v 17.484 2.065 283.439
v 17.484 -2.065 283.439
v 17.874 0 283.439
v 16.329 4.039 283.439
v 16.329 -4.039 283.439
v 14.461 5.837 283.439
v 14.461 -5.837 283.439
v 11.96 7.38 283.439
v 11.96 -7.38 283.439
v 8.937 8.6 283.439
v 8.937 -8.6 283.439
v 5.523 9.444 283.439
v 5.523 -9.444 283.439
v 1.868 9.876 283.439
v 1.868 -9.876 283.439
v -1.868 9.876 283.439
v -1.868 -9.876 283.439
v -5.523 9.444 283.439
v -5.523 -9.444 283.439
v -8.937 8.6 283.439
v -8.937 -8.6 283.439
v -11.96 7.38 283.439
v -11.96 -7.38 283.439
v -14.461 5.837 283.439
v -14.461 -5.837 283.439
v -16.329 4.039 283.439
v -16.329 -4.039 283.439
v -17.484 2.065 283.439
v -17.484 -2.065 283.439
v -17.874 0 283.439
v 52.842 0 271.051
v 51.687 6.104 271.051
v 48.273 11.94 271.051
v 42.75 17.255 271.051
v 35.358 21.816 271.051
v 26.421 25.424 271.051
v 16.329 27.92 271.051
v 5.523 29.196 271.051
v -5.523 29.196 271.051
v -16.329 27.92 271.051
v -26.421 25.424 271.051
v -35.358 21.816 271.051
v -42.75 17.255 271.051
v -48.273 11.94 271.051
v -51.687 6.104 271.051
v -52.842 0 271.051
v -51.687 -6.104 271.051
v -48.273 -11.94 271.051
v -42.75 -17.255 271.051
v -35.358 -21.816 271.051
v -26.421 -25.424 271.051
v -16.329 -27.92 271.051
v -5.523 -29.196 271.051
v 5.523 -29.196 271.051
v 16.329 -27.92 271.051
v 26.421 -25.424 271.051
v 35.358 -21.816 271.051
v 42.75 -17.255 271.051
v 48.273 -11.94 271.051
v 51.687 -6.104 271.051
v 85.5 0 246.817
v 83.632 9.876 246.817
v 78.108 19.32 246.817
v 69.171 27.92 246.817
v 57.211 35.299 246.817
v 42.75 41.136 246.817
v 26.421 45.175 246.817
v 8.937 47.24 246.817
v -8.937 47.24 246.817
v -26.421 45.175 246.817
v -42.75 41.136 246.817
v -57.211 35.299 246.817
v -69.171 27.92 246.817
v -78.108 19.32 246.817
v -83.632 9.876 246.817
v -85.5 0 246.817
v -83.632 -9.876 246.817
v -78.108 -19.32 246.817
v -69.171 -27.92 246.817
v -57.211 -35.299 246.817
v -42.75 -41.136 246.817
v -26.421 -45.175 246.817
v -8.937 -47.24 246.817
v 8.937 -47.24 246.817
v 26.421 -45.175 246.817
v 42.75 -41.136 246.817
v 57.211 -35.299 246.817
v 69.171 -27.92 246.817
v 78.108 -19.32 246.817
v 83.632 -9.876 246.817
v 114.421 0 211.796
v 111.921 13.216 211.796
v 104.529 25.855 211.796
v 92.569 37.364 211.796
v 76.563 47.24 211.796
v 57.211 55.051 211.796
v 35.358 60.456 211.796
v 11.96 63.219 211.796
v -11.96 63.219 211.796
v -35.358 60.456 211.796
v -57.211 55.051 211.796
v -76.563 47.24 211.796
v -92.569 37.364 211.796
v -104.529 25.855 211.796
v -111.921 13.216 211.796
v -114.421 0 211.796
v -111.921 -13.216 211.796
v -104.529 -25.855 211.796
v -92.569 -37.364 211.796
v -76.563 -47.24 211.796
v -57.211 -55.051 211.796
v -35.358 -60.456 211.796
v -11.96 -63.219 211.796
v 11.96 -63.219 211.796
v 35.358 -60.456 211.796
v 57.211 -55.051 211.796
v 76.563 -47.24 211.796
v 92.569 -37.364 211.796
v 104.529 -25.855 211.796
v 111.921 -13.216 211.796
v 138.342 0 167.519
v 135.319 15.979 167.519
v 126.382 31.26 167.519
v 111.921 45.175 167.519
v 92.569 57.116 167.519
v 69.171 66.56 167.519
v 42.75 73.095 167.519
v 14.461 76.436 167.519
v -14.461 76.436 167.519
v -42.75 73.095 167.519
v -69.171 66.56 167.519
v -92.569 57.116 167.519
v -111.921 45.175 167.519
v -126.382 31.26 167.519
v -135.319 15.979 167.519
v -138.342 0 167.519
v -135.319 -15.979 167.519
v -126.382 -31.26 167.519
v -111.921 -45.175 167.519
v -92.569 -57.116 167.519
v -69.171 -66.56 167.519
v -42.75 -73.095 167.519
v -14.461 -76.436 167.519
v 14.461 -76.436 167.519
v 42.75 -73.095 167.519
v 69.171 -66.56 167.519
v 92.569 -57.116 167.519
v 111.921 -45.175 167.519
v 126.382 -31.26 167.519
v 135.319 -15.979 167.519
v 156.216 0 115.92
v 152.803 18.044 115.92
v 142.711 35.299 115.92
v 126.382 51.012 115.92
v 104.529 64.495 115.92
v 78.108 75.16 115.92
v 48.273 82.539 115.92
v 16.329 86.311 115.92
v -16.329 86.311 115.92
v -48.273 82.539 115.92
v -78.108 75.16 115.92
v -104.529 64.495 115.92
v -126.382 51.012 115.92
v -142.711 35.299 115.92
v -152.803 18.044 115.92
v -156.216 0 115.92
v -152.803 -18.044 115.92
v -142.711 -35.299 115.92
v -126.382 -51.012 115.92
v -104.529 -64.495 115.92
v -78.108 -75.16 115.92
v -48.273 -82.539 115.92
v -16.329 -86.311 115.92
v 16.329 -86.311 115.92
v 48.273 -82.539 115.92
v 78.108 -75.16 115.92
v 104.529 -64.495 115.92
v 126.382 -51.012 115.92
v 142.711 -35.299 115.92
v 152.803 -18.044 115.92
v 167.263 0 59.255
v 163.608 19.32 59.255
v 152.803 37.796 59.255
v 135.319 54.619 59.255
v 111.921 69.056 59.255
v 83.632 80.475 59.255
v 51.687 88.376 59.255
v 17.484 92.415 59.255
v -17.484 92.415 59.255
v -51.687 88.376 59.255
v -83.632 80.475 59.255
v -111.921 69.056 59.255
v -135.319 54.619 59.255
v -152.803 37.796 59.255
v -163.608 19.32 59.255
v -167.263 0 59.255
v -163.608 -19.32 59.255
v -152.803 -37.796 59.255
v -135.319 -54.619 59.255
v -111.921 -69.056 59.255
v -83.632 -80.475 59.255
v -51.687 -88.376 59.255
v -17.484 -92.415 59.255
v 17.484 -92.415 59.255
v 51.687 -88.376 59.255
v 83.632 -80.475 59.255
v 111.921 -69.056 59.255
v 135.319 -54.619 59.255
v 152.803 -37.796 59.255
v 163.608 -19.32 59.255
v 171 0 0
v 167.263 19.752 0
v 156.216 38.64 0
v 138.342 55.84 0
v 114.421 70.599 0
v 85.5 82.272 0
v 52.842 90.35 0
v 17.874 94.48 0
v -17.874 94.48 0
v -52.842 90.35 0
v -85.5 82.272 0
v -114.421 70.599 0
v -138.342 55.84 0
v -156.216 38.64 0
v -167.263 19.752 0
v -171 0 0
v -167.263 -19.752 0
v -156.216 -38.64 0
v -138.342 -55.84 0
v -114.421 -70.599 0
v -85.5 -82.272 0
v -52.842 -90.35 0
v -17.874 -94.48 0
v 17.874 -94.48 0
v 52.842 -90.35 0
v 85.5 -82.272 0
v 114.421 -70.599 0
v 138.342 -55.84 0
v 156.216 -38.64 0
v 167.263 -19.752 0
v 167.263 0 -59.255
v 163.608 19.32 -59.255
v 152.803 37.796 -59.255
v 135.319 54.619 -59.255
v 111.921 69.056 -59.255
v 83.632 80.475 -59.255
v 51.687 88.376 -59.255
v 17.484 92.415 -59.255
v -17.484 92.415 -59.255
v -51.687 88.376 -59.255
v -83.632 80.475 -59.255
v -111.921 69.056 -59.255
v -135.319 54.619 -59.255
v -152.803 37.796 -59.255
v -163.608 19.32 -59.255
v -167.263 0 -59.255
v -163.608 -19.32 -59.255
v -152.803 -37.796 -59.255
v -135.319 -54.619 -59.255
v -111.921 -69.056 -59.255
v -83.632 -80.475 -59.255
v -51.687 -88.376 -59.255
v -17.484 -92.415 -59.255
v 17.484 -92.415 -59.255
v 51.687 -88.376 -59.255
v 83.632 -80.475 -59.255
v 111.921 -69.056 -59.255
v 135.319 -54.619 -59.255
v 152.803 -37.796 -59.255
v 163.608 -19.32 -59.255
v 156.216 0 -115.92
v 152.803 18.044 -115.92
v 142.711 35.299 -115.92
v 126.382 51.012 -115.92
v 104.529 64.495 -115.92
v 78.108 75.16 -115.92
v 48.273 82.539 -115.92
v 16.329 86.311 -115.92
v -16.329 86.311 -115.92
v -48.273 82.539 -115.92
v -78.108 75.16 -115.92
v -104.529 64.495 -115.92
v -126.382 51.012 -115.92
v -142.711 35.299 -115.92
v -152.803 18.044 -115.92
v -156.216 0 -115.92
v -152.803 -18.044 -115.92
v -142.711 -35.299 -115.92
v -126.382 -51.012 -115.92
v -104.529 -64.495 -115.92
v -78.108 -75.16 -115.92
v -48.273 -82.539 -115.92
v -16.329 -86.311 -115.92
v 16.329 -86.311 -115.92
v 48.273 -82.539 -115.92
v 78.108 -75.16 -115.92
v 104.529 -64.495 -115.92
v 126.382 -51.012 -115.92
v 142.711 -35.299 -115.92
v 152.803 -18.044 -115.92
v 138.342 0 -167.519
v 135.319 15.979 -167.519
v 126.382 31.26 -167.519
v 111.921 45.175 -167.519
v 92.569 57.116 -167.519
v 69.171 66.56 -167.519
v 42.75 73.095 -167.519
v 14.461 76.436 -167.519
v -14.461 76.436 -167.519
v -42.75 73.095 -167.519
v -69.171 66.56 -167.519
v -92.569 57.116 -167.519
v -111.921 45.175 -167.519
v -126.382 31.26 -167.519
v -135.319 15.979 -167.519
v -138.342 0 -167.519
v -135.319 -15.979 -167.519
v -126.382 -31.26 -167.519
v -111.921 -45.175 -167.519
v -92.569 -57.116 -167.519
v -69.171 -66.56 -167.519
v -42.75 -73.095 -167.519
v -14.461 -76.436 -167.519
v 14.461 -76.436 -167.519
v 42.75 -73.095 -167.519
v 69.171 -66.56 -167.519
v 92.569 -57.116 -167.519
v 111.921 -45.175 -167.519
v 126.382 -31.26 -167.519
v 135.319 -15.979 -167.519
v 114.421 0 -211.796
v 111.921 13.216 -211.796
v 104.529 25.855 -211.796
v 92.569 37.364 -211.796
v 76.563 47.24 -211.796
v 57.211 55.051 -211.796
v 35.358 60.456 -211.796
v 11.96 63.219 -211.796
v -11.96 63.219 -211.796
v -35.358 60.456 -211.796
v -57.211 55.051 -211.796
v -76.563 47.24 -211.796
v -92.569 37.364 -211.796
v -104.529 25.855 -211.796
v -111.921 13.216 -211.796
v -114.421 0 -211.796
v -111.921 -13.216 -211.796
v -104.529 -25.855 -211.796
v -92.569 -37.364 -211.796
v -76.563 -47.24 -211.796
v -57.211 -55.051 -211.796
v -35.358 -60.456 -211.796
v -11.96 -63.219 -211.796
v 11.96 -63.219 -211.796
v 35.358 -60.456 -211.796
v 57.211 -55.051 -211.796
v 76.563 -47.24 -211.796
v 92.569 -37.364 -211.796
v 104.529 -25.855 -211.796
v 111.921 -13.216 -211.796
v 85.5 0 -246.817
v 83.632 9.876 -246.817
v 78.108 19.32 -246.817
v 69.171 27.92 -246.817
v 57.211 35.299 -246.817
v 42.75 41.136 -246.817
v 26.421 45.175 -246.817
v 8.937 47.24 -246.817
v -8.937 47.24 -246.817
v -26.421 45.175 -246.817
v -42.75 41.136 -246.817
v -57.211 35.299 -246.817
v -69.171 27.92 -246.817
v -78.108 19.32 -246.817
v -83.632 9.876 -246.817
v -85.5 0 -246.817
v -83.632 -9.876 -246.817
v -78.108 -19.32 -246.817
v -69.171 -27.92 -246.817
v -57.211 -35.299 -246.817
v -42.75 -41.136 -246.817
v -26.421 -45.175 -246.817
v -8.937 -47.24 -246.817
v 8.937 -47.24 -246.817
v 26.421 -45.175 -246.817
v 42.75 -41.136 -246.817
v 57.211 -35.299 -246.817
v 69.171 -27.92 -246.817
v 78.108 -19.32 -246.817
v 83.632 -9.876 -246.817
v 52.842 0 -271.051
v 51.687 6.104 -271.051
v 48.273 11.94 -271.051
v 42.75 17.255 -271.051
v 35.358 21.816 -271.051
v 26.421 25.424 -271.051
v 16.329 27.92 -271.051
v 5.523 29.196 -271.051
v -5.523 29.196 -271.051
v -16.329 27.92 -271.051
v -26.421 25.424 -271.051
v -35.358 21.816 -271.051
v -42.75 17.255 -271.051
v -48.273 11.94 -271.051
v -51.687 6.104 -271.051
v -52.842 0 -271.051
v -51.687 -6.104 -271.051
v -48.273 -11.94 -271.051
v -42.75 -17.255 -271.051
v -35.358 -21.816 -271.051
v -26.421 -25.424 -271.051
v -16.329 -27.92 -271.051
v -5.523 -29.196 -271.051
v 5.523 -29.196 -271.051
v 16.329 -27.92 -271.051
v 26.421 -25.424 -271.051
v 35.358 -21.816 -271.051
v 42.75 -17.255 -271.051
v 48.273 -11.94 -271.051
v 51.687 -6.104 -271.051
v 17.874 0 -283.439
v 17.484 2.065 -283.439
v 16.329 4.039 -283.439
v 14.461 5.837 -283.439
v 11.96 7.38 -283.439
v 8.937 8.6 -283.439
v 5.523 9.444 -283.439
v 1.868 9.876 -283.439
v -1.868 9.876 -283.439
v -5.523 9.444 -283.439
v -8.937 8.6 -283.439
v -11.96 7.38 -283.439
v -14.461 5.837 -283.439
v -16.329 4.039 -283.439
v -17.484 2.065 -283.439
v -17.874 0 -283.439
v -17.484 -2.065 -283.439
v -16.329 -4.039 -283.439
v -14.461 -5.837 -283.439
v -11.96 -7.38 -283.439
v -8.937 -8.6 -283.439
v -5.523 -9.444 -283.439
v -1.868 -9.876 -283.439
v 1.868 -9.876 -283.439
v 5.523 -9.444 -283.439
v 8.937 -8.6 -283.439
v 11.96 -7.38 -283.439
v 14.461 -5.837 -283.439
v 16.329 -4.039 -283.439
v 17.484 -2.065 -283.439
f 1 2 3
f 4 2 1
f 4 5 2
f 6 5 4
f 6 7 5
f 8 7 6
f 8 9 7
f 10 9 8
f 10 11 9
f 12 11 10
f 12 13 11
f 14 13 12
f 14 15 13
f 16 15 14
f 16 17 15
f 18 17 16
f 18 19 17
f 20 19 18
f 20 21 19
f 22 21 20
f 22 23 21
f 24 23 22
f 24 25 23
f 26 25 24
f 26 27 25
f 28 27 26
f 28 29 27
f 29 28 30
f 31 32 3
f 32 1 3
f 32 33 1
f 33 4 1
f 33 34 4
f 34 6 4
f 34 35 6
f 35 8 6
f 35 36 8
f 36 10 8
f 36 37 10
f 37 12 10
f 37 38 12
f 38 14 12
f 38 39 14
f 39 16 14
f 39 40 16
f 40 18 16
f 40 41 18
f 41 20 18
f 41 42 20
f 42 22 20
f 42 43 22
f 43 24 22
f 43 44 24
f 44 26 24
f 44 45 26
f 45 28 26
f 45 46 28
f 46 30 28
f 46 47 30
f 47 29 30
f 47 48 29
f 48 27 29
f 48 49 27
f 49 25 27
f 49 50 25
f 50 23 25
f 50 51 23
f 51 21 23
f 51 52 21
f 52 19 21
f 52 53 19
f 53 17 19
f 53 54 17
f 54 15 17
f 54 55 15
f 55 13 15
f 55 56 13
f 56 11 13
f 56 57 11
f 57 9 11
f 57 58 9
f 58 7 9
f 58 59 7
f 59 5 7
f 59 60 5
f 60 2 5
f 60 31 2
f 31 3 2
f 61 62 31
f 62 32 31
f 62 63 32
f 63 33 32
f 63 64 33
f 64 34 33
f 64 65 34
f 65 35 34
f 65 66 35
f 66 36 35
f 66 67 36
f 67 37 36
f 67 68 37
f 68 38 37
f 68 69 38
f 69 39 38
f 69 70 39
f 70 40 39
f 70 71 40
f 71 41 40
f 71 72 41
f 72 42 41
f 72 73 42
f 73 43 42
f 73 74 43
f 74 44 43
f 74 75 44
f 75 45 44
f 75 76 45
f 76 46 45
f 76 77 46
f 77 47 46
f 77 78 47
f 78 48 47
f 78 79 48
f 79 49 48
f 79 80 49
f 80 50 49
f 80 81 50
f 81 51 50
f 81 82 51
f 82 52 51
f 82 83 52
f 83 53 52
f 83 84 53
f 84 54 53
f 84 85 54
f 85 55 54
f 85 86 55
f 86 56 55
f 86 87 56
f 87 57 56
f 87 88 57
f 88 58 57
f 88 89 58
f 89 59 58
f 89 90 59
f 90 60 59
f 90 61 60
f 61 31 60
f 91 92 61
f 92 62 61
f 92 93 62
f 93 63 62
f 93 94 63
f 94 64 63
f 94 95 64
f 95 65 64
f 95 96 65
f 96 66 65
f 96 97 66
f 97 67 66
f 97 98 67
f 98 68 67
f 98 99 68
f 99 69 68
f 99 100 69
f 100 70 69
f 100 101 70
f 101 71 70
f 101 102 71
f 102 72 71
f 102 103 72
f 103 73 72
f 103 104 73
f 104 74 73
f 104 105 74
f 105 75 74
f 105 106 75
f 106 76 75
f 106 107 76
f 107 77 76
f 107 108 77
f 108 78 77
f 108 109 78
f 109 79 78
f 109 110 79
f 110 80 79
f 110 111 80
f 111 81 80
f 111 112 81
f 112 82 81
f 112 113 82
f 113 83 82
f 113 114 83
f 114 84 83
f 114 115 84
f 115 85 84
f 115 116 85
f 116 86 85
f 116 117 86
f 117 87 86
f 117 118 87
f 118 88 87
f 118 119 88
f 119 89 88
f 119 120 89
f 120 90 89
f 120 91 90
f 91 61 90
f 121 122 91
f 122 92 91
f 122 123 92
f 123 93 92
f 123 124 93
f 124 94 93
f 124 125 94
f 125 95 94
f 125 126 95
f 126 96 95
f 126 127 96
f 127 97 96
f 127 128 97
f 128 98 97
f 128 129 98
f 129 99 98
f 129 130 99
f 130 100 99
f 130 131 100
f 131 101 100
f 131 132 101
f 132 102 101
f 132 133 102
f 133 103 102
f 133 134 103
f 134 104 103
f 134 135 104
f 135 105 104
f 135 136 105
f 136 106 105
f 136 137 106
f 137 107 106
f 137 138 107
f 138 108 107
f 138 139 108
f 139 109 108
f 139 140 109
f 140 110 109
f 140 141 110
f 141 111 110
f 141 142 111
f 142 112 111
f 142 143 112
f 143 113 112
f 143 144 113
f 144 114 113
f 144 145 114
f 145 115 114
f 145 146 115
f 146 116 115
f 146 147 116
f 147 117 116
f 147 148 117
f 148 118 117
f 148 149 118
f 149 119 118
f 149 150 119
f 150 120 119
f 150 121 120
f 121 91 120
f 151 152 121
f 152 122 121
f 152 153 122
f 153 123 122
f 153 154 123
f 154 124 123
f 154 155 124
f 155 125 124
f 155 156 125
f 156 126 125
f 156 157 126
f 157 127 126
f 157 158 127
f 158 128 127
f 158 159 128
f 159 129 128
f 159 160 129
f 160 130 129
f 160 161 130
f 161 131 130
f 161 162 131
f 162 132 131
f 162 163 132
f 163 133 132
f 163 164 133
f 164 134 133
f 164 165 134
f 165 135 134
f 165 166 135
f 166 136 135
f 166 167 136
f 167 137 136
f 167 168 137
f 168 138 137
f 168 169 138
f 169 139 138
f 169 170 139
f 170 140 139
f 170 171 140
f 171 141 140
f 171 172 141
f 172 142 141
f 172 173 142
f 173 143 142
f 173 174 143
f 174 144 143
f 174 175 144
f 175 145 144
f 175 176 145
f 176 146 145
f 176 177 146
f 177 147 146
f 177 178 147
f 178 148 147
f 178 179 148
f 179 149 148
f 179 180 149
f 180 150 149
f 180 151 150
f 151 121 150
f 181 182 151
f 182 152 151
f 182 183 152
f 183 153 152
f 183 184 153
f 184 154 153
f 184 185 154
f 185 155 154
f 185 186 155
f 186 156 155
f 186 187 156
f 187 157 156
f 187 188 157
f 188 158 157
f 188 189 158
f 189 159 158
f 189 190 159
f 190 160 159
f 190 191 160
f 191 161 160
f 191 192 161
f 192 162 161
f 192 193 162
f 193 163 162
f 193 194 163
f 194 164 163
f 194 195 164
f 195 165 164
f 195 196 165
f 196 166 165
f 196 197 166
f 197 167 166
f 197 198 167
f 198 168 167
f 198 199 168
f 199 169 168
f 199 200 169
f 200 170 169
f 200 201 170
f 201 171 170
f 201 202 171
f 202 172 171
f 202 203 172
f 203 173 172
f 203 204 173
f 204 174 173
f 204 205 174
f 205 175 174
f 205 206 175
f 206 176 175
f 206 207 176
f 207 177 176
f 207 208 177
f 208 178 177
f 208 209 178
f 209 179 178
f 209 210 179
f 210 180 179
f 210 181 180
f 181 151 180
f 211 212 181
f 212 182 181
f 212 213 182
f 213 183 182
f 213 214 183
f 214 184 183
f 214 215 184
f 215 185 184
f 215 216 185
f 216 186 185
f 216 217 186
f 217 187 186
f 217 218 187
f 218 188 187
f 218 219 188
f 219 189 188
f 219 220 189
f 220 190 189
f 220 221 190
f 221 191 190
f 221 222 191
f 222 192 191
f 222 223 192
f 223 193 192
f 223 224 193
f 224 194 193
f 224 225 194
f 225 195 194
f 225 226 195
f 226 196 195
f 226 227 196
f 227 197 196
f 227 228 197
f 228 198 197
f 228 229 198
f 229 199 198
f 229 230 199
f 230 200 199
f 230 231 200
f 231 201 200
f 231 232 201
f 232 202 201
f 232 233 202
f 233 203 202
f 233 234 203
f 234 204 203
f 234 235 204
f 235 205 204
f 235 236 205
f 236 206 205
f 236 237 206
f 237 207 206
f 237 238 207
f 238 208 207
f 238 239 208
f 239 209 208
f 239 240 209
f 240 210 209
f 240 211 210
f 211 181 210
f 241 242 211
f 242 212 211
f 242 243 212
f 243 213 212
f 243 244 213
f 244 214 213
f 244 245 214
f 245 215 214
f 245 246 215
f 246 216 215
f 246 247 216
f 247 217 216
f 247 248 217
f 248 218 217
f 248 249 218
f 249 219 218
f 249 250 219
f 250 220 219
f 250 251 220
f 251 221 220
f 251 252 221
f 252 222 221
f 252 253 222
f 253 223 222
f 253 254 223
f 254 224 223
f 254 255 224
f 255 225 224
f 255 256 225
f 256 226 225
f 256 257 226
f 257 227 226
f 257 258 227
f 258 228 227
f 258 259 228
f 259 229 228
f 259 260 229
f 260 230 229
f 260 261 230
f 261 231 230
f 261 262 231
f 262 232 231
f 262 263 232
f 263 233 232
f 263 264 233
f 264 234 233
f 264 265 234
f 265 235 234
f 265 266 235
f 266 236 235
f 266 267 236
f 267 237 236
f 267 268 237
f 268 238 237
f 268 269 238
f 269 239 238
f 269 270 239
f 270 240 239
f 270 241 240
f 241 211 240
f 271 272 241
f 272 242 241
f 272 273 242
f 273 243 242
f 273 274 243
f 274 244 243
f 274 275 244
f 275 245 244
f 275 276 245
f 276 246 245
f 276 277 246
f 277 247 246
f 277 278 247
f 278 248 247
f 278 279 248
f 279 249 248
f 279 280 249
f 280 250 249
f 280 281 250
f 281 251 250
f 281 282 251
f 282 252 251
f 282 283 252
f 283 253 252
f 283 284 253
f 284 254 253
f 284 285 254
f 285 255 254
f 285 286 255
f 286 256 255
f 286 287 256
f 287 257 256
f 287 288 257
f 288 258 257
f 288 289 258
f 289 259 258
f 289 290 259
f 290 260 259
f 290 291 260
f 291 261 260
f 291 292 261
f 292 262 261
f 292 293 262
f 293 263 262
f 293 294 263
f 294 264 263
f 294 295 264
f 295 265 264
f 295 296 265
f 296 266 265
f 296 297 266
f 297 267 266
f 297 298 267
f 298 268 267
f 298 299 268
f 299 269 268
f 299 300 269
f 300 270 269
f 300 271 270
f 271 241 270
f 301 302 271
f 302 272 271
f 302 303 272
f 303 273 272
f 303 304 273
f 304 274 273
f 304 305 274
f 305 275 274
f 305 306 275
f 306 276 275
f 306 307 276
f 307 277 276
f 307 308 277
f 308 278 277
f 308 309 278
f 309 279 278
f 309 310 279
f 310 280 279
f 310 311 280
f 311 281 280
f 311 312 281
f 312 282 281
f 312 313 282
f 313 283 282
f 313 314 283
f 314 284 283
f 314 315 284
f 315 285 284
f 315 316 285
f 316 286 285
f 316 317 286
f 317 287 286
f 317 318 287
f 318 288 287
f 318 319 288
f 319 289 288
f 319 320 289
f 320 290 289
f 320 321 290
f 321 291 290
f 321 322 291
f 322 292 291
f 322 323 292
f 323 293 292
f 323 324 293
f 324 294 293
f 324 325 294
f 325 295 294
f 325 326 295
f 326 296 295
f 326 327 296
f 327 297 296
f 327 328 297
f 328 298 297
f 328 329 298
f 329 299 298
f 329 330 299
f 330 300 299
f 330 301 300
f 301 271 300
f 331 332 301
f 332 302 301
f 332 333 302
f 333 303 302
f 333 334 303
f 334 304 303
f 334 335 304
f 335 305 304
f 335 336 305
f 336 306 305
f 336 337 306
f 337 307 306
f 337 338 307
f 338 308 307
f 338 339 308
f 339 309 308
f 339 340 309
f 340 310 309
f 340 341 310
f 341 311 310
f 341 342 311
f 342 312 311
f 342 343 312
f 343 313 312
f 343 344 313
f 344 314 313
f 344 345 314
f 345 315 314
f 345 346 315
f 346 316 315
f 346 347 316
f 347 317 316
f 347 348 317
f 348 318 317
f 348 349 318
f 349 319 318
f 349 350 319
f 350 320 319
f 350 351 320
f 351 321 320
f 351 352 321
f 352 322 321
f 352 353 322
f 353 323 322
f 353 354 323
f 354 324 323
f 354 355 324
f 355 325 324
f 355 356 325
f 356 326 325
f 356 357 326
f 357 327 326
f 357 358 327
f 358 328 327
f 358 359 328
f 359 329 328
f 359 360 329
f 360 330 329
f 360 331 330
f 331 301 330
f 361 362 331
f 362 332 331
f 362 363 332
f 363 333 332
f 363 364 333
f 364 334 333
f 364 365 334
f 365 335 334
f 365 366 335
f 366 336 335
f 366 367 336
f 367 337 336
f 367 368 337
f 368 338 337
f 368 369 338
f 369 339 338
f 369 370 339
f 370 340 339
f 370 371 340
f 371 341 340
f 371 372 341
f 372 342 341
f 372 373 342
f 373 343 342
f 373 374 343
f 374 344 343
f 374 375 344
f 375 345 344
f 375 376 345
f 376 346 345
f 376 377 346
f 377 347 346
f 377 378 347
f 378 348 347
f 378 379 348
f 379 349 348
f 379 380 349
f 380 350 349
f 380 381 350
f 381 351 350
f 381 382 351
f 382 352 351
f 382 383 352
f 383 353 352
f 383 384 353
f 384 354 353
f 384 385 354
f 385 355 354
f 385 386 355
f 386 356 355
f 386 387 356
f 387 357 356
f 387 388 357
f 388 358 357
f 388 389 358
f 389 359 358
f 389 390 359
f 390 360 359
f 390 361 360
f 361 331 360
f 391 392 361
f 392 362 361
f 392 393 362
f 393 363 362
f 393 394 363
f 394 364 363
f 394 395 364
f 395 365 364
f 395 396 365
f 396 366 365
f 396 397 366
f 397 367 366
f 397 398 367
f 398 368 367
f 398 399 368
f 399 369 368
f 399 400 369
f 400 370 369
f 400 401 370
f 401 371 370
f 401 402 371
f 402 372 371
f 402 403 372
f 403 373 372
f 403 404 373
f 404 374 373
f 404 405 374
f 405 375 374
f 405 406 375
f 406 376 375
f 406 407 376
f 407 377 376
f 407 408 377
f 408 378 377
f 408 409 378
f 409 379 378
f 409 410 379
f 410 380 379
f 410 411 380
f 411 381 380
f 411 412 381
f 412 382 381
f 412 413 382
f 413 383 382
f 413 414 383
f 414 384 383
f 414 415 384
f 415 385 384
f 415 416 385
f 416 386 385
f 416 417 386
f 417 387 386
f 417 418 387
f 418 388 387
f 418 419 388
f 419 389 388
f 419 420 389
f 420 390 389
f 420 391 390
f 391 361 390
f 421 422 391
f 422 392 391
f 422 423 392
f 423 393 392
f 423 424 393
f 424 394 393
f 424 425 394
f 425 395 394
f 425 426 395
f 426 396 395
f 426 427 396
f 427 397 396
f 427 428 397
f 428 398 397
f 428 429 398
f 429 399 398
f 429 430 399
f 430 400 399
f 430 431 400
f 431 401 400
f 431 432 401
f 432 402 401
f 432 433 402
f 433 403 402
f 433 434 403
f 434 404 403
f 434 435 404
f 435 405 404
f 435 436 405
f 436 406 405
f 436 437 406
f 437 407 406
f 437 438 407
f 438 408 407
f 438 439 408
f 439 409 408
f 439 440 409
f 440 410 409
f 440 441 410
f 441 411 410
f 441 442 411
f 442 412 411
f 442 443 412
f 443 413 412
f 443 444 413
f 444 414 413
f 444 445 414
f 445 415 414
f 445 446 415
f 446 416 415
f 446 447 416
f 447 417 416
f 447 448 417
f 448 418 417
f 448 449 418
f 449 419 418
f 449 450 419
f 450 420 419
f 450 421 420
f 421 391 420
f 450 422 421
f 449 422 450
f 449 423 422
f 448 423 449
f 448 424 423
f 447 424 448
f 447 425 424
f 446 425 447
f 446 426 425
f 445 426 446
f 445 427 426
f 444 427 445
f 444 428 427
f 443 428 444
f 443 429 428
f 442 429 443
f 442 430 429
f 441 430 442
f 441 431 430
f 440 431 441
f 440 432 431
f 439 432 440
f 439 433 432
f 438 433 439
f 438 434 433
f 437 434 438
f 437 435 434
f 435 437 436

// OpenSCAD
// Generated by SolidPython 1.0.1 on 2020-07-29 00:46:48


scale(v = [9, 5, 15]) {
	sphere(r = 19);
}
/***********************************************
*********      SolidPython code:      **********
************************************************
 
# import packages: SolidPython
from solid import *
from solid.utils import *
from itertools import chain, combinations, permutations


class Resize:

    def __init__(self, scad_file):
        self.scad_file = scad_file
        #self.scad_file = import_scad(scad_file)
        # cone/cylinder param:
        self.r1 = 0
        self.r2 = 0
        self.h = 0
        # rectangular prism param:
        self.w = 0
        self.l = 0
        # ellipse param:
        self.r = 0

    # import OpenScad code (file name corresponds to shape)


    # classify shape + parameters
    def assign(self, param1, param2, param3):
        if self.scad_file == 'cone.scad':
            self.r1 = param1
            self.r2 = param2
            self.h = param3
        elif self.scad_file == 'cylinder.scad':
            self.r1 = param1
            self.r2 = param2
            self.h = param3
        elif self.scad_file == 'rectangularPrism.scad':
            self.h = param1
            self.l = param2
            self.w = param3
        else:
            self.r = param1
            self.h = param2

    # resize parameters
    def iterate(self):
        x = range(3, 20, 2)
        i = 1
        if self.scad_file == 'cone.scad':
            tempList = list(permutations(x, 2))
            for temp in tempList:
                param1 = temp[0]
                param2 = temp[1]
                filepath = 'produced_scad_files/' + 'cone' + str(param1) + '_' + str(param2) + '_' + '.scad'
                scad_render_to_file(cylinder(h=param1, r1=param2, r2=0), filepath)

        elif self.scad_file == 'cylinder.scad':
            tempList = list(permutations(x, 3))
            for temp in tempList:
                param1 = temp[0]
                param2 = temp[1]
                filepath = 'produced_scad_files/' + 'cylinder' + str(param1) + '_' + str(param2) + '_' + '.scad'
                scad_render_to_file(cylinder(h=param1, r1=param2, r2=param2), filepath)

        elif self.scad_file == 'rectangularPrism.scad':
            tempList = list(permutations(x, 3))
            for temp in tempList:
                param1 = temp[0]
                param2 = temp[1]
                param3 = temp[2]
                filepath = 'produced_scad_files/' + 'rectangularPrism' + str(param1) + '_' + str(param2) + '_' + str(
                    param3) + '.scad'
                scad_render_to_file(cube(size=(param1, param2, param3)), filepath)

        elif self.scad_file == 'ellipse.scad':
            tempList = list(permutations(x, 4))
            for temp in tempList:
                param1 = temp[0]
                param2 = temp[1]
                param3 = temp[2]
                param4 = temp[3]
                filepath = 'produced_scad_files/' + 'ellipse' + str(param1) + '_' + str(param2) + '_' + str(param3) + '_' + str(param4) + '.scad'
                scad_render_to_file(scale([param1, param2, param3])(sphere(r=param4)), filepath)

    def render_to_scadfile(self):
        scad_render_to_file(scad, 'example.scad') 
 
************************************************/
